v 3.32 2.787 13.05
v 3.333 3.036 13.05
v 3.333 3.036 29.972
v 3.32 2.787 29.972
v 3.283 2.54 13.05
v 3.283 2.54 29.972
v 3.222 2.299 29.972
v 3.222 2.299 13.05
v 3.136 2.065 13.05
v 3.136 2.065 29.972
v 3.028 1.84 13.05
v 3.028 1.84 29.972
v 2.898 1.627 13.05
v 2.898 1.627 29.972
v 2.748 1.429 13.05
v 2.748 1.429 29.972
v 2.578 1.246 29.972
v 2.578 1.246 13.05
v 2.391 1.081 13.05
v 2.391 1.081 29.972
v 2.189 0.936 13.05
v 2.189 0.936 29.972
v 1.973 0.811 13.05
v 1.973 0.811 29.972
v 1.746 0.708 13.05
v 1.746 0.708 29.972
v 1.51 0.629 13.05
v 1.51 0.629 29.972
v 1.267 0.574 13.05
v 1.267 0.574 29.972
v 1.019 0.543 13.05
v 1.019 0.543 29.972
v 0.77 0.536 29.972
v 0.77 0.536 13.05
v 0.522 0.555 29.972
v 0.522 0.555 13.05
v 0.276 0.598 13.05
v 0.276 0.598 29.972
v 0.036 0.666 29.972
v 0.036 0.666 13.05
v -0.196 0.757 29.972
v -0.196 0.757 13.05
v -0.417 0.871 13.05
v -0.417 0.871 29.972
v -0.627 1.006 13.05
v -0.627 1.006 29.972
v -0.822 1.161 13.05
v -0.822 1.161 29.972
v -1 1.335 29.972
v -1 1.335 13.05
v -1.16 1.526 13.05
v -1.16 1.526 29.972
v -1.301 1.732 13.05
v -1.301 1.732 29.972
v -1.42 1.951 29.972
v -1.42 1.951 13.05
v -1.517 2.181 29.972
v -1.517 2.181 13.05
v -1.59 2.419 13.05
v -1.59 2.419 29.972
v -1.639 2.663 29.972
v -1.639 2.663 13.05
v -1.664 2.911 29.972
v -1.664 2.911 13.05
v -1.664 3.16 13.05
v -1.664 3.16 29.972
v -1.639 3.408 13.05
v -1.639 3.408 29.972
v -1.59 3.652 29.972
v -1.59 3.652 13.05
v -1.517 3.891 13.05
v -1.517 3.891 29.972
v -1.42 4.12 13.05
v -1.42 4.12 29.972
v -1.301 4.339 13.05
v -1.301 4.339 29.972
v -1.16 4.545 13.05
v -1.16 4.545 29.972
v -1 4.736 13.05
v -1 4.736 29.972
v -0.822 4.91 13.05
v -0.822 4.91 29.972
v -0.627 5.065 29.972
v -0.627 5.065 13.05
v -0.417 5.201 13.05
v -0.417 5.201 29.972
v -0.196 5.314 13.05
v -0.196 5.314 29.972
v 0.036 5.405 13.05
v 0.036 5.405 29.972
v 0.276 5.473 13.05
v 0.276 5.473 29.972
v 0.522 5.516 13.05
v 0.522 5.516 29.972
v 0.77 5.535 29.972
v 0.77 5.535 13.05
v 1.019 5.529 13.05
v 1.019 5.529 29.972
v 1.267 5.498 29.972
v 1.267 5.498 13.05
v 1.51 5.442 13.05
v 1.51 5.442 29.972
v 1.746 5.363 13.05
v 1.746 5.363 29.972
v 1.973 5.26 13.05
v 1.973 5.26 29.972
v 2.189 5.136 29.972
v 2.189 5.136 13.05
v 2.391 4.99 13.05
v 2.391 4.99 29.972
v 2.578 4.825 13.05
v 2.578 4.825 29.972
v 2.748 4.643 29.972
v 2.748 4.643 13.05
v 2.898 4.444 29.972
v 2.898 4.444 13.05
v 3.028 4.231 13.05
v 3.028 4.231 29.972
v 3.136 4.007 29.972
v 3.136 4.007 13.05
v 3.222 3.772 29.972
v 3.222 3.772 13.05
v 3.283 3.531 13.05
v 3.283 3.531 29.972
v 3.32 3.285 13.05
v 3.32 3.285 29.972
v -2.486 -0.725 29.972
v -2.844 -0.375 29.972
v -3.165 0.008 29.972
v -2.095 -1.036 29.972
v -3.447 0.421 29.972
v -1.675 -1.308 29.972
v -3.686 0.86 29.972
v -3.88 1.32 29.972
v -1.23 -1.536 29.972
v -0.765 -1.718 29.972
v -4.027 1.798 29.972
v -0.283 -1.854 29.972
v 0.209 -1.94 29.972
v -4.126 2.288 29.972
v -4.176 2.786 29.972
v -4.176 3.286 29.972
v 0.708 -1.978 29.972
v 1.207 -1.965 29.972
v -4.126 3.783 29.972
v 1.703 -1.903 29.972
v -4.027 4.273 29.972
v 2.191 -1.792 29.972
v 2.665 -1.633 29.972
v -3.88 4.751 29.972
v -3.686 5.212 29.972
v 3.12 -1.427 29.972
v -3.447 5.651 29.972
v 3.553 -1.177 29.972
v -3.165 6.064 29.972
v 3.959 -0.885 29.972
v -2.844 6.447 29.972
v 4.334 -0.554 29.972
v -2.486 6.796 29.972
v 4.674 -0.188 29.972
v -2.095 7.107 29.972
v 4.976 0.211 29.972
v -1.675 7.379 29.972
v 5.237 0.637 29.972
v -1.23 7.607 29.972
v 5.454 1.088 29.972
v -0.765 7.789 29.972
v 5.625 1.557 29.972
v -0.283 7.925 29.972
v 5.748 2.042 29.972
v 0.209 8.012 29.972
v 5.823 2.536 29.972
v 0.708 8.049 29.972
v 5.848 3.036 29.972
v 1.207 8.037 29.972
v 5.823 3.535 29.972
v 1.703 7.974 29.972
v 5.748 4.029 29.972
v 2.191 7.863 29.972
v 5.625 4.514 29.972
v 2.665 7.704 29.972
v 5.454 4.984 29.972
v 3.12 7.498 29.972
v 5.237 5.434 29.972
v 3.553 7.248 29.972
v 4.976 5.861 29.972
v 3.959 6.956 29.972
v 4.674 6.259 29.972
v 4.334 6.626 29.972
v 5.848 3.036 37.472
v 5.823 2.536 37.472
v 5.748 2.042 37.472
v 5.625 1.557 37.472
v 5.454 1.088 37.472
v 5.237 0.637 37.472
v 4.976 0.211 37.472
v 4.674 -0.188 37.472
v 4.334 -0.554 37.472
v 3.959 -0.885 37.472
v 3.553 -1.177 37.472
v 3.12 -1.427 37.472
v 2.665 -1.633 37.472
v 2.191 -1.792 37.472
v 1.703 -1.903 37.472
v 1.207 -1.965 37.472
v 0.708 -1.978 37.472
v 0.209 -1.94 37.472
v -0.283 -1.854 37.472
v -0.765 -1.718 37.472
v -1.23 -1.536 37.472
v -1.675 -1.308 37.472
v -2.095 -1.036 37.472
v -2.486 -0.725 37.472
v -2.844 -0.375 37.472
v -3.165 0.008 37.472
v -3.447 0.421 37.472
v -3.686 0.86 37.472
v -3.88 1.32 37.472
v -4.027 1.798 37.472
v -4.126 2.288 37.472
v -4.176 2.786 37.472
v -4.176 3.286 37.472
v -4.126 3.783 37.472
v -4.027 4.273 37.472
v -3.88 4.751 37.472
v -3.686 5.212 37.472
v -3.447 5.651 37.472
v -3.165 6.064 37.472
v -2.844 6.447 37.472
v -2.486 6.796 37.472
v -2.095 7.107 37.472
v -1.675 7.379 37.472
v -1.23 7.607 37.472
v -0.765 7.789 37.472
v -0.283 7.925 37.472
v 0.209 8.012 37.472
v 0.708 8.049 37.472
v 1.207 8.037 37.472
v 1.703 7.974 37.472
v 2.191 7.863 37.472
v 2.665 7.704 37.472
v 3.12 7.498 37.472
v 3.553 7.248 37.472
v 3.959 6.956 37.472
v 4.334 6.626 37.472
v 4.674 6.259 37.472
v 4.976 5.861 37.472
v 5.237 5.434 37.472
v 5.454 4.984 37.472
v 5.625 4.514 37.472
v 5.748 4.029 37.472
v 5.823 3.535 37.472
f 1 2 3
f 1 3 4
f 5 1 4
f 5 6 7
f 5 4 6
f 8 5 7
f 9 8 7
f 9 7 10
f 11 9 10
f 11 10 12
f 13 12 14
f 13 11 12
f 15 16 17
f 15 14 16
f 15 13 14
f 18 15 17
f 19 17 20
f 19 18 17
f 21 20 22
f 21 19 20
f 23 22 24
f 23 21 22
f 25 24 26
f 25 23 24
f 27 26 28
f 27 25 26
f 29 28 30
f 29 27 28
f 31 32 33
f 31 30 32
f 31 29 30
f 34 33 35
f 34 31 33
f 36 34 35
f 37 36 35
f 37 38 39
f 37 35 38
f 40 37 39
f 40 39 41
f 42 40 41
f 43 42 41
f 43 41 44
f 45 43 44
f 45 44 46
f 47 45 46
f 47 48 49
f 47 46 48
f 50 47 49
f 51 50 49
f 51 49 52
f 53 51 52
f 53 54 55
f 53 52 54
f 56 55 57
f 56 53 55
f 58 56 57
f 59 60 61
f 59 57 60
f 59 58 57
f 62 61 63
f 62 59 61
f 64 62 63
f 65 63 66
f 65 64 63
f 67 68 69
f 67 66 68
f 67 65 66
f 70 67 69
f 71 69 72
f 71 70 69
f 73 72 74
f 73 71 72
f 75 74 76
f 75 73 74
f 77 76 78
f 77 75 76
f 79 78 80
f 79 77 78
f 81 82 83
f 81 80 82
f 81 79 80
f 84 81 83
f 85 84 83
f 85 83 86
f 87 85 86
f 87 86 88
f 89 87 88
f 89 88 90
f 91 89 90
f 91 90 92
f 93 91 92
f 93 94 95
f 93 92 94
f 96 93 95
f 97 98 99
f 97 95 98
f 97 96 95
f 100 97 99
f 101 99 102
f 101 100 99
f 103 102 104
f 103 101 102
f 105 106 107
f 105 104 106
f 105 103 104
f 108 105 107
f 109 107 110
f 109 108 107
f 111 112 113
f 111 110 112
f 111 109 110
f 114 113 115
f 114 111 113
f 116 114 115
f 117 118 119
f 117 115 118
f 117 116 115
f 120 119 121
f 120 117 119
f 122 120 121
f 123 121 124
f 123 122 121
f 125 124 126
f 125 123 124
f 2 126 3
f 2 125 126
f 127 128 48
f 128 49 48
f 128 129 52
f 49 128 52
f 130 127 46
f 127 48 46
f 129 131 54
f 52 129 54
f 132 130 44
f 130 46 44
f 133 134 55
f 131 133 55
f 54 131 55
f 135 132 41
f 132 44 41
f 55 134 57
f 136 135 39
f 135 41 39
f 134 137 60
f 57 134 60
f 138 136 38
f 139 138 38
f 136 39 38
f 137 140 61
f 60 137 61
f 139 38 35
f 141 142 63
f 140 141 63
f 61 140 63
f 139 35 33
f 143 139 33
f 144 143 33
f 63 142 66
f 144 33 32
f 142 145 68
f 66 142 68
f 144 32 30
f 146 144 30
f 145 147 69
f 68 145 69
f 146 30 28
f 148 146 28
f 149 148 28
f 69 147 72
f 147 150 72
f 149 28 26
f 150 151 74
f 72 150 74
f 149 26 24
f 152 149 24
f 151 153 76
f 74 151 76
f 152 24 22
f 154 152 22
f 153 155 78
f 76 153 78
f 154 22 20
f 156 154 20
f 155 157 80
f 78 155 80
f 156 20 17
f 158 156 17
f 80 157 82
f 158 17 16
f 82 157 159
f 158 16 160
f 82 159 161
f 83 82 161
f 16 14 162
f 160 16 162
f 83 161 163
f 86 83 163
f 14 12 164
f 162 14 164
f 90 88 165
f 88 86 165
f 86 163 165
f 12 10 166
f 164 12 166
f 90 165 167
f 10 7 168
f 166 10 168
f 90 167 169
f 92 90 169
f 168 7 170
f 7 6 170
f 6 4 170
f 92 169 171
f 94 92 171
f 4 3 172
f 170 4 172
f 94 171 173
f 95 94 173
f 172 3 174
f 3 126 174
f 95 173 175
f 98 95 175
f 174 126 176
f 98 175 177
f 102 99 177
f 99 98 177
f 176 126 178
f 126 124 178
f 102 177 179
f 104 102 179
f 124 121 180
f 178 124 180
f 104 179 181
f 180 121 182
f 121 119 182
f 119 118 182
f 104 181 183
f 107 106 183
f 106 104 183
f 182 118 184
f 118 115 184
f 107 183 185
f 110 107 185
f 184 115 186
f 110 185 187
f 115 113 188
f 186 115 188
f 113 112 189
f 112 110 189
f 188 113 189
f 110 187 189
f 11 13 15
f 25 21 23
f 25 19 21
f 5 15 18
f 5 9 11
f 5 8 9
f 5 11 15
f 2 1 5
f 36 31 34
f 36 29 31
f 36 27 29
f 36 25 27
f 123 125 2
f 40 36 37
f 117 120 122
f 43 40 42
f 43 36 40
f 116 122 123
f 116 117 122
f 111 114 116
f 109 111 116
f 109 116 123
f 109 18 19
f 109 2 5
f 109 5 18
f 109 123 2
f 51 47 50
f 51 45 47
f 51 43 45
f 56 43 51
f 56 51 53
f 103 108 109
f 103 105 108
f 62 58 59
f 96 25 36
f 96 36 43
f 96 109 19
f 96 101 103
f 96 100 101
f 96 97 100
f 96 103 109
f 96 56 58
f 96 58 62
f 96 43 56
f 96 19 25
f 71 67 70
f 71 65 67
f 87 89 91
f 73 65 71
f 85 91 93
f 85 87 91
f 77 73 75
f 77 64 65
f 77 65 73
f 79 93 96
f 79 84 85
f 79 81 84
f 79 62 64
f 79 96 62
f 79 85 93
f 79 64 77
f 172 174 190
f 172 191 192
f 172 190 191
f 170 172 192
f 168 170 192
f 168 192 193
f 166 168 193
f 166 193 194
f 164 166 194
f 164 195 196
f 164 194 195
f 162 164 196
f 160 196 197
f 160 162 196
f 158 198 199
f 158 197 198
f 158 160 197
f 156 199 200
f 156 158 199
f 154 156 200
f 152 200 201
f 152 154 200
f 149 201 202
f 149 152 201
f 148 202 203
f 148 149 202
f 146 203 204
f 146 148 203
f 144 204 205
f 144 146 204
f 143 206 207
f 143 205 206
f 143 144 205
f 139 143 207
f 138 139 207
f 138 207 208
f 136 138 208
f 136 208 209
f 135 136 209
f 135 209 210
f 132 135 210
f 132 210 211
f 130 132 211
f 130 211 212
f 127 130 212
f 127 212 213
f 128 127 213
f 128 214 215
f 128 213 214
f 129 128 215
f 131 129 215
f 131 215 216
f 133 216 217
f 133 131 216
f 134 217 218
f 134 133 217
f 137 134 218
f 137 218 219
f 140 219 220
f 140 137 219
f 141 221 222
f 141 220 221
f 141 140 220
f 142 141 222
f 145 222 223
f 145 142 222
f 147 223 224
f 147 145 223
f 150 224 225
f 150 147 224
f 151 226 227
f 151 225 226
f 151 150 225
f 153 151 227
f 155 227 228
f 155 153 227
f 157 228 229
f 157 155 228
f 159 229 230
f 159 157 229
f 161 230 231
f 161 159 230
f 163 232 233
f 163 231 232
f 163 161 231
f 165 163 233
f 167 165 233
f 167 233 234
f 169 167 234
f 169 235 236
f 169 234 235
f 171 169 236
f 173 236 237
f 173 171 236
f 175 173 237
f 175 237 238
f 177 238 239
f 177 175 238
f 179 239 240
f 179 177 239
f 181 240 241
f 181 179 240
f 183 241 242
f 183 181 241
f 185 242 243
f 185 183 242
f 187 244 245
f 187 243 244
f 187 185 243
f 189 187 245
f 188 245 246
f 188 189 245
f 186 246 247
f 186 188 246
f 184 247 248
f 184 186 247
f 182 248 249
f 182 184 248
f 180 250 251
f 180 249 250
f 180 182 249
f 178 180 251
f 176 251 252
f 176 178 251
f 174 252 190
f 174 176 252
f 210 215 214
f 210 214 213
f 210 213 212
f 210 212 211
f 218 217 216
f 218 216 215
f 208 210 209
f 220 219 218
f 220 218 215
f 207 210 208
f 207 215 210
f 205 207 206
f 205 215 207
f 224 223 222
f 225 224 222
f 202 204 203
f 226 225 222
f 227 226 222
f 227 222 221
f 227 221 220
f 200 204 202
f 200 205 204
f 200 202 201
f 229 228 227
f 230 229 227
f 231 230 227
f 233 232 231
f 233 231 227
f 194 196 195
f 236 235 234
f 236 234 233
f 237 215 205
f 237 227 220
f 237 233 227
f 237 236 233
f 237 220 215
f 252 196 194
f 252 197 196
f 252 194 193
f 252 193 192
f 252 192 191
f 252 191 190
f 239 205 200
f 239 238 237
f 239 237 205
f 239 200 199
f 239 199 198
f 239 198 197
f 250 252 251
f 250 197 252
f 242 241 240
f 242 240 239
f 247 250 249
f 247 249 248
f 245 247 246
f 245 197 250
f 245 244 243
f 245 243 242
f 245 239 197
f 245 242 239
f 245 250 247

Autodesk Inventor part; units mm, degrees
ref_plane "YZ Plane" through (0, 0, 0) normal (1, 0, 0) x (0, 1, 0)
ref_plane "XZ Plane" through (0, 0, 0) normal (0, 1, 0) x (-1, 0, 0)
ref_plane "XY Plane" through (0, 0, 0) normal (0, 0, 1) x (1, 0, 0)
sketch "Sketch1" plane through (0, 0, 0) normal (0, 0, 1) x (1, 0, 0)
  circle A0 centre (0.8326, 3.0356) radius 2.5
  point P0 (0, 0)
  dimension "d0" = 5
extrude "Extrusion1" add sketch "Sketch1" along normal blind 29.972
sketch "Sketch2" plane through (0.8326, 3.0356, 29.972) normal (0, 0, 1) x (1, 0, 0)
  circle A0 centre (0, 0) radius 2.5 projected
  circle A1 centre (0, 0) radius 5.015
  point P0 (-0.8326, -3.0356)
extrude "Extrusion2" add sketch "Sketch2" along normal blind 7.5 contours A0 | A1
sketch "Sketch3" plane through (0.8326, 3.0356, 0) normal (0, 0, -1) x (-1, 0, 0)
  circle A0 centre (0, 0) radius 5.015 projected
  circle A1 centre (0, 0) radius 2.5 projected
  circle A2 centre (0, 0) radius 2.5 projected
  point P0 (0.8326, -3.0356)
extrude "Extrusion3" add sketch "Sketch3" along normal blind 6 contours A1
sketch "Sketch4" plane through (0.8326, 3.0356, -6) normal (0, 0, -1) x (-1, 0, 0)
  circle A0 centre (0, 0) radius 2.5 projected
  point P0 (0.8326, -3.0356)
extrude "Extrusion4" cut sketch "Sketch4" against normal blind 19.05
properties part number "5mm_bolt_short" material "Steel, Alloy"
